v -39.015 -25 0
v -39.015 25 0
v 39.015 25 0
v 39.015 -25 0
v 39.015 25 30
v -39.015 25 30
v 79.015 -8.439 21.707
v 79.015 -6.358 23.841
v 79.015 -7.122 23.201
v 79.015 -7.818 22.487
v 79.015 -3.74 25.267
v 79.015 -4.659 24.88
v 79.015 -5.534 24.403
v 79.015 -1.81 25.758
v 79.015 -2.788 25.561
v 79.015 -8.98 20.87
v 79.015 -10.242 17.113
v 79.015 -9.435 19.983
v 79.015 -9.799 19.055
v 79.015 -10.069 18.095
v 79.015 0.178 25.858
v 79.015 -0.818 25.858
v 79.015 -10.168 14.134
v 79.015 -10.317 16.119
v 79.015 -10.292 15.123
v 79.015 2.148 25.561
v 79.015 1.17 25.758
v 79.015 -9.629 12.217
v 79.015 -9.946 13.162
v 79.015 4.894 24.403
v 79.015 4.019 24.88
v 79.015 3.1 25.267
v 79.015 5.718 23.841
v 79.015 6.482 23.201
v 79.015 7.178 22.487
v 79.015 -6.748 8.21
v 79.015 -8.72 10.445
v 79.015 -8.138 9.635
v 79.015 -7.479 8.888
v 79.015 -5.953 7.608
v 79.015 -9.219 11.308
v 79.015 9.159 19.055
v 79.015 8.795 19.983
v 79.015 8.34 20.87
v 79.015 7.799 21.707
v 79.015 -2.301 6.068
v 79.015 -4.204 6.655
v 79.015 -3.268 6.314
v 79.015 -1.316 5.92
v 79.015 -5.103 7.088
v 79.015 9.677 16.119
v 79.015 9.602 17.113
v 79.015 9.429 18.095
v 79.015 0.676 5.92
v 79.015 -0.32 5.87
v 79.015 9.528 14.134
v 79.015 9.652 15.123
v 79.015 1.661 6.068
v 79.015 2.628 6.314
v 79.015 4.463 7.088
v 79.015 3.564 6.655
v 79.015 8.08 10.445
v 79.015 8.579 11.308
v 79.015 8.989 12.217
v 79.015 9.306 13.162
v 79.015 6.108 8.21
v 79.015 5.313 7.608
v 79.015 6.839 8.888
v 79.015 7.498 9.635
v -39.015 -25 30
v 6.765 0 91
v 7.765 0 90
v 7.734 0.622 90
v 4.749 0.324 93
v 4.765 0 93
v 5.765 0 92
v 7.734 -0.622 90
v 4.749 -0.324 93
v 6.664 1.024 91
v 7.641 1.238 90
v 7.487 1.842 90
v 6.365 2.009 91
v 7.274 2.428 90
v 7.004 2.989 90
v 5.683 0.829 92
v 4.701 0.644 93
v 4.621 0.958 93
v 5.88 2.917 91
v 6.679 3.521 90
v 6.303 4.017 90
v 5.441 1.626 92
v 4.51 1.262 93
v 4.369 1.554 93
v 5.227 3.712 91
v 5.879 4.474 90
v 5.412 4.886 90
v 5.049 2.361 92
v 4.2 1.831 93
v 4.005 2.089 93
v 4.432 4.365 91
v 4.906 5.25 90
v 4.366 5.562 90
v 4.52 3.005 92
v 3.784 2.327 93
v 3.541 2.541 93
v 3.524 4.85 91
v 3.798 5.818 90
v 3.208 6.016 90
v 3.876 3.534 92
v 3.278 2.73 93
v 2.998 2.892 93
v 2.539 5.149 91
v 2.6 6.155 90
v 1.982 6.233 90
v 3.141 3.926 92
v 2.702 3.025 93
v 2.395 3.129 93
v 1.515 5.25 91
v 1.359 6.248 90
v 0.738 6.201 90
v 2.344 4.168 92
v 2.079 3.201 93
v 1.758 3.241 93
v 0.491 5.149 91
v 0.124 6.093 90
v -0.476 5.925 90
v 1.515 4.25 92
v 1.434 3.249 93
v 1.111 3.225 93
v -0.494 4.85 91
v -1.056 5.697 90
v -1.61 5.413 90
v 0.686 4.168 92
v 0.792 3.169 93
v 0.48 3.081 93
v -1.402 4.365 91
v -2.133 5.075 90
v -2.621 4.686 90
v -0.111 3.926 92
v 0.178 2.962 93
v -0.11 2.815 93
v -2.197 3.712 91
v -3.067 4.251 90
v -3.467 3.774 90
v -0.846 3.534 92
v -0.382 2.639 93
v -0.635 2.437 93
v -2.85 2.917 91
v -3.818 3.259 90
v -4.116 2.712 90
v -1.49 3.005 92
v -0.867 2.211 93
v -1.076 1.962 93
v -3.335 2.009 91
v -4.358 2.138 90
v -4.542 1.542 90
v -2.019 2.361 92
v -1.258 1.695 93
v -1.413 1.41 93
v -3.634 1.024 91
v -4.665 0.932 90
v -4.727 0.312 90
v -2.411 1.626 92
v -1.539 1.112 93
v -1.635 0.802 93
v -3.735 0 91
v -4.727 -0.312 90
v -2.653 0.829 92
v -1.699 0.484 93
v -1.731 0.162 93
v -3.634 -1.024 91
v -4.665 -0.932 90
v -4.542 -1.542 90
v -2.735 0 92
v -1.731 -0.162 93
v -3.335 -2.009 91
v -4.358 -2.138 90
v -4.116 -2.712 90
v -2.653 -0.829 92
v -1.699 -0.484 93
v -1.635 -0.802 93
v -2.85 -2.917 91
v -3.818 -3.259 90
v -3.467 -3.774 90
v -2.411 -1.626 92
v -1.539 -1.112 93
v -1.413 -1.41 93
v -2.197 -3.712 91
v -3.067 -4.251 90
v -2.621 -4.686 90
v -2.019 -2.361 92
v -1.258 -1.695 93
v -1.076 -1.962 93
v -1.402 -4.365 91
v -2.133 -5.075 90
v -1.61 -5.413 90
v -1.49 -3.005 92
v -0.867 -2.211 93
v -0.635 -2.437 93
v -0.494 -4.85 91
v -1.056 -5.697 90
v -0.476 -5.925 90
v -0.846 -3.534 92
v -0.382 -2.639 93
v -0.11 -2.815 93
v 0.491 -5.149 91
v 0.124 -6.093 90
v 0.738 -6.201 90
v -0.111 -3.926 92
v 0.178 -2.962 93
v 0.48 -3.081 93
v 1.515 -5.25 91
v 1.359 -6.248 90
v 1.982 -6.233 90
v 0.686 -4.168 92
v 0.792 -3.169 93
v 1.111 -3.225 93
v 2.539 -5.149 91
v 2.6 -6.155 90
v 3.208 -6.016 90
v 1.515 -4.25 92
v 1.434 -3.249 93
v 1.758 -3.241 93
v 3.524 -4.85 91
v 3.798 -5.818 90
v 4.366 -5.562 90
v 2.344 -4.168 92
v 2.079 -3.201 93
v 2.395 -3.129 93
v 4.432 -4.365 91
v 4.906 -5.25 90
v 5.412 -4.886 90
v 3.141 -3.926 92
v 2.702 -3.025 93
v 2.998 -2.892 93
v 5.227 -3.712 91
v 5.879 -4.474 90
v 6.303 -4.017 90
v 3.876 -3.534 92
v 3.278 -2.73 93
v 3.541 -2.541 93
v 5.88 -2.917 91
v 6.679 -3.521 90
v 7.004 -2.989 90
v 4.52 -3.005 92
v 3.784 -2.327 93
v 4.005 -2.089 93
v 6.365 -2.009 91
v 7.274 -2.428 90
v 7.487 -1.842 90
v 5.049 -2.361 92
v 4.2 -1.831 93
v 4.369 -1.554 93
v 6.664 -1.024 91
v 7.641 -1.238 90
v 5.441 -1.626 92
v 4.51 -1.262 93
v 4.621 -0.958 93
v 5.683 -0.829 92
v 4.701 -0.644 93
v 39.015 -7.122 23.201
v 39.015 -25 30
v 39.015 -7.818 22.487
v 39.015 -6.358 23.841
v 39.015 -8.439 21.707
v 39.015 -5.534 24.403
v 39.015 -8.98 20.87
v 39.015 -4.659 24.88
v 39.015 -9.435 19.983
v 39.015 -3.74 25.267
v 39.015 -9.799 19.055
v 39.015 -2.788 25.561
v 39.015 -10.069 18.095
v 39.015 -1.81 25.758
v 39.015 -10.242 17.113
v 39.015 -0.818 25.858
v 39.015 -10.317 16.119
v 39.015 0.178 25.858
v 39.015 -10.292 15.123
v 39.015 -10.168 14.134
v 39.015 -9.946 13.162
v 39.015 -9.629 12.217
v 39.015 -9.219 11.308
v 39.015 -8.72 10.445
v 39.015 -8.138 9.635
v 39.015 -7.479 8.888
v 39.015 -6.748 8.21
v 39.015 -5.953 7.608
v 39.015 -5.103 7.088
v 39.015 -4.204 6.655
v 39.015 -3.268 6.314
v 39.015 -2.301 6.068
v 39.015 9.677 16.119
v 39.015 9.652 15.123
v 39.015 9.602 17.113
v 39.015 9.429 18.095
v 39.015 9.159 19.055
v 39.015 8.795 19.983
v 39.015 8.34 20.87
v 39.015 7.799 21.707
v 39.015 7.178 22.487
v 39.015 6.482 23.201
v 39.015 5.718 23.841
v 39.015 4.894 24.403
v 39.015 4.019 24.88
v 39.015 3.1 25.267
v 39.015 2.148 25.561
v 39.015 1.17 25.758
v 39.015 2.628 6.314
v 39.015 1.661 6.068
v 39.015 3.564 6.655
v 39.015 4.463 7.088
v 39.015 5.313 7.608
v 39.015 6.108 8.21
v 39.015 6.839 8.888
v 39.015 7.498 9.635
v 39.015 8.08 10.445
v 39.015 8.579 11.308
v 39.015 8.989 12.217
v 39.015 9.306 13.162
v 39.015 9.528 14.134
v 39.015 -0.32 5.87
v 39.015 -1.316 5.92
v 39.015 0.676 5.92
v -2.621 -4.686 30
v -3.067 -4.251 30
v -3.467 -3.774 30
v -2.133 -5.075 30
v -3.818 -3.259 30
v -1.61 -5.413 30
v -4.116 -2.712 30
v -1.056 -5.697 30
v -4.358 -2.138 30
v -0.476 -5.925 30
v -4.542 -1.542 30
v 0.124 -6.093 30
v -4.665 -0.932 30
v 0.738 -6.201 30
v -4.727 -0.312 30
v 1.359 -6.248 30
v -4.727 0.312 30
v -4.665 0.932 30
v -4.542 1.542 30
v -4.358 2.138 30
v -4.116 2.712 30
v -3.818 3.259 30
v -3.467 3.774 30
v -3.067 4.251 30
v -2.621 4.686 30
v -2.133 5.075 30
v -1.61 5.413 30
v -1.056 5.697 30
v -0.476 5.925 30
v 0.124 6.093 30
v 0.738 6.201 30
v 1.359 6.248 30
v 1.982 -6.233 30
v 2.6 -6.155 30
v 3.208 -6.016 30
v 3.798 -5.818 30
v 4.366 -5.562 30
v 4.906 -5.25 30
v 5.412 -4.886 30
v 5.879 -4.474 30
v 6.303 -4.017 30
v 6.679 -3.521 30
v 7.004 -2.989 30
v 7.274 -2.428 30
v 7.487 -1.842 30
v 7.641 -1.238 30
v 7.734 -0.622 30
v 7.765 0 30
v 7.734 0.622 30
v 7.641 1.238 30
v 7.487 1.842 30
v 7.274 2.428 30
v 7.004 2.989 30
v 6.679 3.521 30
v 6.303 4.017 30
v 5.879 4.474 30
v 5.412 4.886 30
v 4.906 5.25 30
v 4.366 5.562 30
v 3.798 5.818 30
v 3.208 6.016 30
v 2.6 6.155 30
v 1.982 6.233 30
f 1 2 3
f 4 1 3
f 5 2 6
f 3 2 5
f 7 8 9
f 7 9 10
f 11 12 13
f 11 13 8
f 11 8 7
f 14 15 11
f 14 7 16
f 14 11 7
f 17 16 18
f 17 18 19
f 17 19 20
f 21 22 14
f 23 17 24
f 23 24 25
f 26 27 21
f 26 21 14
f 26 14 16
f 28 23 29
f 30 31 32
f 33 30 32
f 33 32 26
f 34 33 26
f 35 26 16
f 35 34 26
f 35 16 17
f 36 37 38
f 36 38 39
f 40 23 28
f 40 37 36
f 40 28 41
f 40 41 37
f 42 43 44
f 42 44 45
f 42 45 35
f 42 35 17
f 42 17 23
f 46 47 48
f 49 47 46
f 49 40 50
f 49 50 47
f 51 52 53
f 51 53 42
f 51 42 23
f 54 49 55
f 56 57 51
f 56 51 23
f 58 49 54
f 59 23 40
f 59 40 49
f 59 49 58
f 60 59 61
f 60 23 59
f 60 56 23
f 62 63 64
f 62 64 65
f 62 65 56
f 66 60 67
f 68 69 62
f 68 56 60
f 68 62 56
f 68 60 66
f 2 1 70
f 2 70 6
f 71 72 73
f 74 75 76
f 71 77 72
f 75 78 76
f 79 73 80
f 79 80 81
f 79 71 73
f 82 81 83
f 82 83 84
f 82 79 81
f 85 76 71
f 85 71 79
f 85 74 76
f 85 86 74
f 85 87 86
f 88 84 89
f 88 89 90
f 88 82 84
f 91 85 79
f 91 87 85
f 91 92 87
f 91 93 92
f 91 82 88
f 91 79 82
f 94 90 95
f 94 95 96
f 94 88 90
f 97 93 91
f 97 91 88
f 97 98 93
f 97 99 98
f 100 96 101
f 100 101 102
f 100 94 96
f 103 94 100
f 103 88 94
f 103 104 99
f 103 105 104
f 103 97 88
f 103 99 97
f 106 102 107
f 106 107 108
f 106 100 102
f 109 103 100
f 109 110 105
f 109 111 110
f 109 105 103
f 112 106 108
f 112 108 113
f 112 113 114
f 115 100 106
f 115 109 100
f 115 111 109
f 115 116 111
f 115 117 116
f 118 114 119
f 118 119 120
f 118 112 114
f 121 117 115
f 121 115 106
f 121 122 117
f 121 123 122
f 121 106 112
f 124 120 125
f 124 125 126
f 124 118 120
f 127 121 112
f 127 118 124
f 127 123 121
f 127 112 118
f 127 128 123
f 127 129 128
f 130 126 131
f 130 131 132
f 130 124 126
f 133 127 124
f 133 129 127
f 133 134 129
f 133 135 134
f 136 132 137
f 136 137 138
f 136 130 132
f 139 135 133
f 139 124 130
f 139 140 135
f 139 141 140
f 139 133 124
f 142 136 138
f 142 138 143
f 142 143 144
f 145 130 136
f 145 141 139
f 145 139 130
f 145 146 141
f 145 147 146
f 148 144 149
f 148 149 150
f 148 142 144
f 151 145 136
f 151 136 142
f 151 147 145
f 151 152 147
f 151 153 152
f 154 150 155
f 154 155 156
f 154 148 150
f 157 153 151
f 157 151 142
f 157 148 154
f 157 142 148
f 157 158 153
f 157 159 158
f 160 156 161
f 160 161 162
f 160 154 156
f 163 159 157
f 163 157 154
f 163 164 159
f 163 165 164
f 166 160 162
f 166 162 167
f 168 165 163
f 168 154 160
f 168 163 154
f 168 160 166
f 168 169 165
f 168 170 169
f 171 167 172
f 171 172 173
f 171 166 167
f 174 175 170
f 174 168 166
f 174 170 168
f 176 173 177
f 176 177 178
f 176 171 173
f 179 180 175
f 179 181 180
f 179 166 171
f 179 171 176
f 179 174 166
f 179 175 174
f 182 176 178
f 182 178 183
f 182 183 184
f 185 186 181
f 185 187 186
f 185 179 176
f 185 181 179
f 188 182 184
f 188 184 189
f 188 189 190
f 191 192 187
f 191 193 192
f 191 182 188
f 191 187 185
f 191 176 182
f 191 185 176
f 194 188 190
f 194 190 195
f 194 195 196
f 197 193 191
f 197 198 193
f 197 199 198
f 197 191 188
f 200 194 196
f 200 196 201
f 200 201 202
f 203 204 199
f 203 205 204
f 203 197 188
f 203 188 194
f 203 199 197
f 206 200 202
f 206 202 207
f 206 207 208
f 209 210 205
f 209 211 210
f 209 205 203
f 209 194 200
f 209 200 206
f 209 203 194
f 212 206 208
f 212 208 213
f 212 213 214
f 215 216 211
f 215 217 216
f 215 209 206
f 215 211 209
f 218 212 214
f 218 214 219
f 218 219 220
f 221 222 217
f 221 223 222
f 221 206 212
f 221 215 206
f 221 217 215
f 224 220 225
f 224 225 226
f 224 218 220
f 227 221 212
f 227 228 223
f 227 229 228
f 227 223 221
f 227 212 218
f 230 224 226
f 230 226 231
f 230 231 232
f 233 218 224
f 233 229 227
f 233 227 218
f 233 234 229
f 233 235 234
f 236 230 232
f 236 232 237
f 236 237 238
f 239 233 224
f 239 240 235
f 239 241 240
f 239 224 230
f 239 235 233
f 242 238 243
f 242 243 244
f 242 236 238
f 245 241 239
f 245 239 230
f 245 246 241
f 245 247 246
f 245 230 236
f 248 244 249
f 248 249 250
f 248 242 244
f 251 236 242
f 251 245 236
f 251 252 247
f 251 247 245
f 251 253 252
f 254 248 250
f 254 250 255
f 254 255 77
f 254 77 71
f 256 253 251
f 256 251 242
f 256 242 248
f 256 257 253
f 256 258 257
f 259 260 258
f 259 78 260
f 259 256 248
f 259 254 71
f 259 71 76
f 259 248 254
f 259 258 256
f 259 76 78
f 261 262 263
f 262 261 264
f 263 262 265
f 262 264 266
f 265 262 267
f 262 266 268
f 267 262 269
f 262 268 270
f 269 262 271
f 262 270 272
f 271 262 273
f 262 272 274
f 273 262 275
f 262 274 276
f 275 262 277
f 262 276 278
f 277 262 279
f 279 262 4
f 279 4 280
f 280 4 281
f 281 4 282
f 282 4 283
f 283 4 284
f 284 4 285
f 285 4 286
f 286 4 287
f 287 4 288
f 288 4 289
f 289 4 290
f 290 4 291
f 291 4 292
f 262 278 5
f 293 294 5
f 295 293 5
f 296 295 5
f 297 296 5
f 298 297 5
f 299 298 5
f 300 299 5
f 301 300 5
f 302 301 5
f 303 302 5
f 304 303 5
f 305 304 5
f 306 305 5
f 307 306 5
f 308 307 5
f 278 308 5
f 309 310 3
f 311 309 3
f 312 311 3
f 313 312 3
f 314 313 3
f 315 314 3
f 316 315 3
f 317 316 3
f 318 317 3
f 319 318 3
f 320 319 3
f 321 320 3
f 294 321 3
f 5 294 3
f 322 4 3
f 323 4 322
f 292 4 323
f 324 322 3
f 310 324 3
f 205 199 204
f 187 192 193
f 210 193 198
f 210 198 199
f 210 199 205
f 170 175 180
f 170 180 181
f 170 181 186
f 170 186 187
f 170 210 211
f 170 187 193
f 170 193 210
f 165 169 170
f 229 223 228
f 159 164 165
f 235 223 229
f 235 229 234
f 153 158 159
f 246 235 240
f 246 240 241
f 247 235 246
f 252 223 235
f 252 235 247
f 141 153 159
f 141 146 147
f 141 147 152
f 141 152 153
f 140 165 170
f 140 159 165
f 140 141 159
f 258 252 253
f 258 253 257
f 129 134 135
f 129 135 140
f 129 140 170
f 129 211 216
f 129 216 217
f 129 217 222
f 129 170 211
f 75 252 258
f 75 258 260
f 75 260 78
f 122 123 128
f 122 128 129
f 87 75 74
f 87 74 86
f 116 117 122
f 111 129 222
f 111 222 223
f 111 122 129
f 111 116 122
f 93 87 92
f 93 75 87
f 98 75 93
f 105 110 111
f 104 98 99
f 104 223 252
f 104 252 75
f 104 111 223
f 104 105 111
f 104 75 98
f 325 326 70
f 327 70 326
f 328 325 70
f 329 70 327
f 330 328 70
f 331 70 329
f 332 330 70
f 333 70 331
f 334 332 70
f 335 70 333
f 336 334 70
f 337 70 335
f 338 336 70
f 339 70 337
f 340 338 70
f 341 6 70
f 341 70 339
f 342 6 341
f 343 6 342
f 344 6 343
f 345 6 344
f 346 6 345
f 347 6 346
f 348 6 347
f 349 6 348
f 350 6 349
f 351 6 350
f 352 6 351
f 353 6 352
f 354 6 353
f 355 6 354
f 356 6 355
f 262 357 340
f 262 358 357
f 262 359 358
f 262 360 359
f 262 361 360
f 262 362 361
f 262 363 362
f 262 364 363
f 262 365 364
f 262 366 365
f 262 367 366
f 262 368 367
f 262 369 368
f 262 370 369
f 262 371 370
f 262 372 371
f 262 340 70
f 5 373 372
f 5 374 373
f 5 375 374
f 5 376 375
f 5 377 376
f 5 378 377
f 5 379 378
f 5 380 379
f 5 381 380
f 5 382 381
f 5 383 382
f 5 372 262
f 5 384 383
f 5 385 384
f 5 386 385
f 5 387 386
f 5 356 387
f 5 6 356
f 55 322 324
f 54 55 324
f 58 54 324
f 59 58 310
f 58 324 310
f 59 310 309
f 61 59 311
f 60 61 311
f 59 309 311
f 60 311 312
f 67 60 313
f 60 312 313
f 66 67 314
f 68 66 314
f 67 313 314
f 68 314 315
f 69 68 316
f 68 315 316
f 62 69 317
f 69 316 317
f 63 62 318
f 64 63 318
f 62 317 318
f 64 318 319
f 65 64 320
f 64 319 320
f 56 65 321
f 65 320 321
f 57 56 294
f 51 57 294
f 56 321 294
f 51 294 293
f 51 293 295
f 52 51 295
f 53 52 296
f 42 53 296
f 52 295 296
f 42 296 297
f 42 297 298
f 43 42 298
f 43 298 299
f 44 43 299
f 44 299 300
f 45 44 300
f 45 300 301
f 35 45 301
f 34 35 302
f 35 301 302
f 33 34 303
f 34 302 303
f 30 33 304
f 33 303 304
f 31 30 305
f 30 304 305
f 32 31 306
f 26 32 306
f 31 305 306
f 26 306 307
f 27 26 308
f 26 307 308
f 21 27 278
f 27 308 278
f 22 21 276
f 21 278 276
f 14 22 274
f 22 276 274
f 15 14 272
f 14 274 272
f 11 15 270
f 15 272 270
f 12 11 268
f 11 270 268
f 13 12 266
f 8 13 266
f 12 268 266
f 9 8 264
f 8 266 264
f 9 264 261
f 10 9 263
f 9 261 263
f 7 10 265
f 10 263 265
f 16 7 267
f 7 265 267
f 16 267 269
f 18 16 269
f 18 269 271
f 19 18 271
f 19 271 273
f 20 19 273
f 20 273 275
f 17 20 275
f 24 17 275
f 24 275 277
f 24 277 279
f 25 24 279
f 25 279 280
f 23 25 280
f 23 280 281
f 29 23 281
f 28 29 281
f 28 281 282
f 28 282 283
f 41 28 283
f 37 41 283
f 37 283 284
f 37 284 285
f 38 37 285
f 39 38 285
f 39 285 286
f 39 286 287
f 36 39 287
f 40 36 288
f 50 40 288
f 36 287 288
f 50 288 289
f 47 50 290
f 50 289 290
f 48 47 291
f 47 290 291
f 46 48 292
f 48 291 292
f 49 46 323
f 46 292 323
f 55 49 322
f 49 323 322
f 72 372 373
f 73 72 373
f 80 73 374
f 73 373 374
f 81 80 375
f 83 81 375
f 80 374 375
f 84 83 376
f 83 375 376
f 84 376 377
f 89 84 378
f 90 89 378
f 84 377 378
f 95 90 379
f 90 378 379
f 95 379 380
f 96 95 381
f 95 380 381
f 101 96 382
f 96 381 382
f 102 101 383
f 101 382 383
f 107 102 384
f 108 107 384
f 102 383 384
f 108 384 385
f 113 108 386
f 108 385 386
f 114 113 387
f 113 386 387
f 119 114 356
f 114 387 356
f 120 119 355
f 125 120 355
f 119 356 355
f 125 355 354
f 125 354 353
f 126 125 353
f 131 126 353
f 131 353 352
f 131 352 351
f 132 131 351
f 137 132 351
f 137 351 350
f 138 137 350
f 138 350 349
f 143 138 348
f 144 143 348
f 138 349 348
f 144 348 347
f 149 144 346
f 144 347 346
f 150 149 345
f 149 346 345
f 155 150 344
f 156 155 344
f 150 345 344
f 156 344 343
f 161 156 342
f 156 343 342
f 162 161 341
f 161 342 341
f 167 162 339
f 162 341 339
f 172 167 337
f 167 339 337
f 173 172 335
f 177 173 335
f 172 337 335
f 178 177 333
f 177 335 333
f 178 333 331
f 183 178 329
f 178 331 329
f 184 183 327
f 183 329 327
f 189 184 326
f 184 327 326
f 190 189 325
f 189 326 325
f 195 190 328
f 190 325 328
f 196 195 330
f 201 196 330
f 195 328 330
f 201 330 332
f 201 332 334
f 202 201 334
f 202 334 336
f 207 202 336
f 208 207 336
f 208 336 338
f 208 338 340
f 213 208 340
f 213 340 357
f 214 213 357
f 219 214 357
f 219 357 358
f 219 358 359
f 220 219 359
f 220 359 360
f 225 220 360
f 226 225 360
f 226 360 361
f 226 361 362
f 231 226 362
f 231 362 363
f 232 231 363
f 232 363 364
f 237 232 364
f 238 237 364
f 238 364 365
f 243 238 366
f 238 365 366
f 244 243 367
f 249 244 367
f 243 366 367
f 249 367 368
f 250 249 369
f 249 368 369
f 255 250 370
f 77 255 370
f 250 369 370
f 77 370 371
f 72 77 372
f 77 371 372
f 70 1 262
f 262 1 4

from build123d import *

# Parameters (mm, degrees)
SKETCH1_W           = 78.03
SKETCH1_H           = 50
BOSS_EXTRUDE2_DEPTH = 30
SKETCH2_R           = 10
BOSS_EXTRUDE3_DEPTH = 40
SKETCH3_R           = 6.25
BOSS_EXTRUDE8_DEPTH = 63
CHAMFER6_SIZE       = 3


with BuildPart() as part:
    # Sketch1 → Boss-Extrude2 (new body)
    with BuildSketch(Plane.XY):
        Rectangle(SKETCH1_W, SKETCH1_H)
    extrude(amount=BOSS_EXTRUDE2_DEPTH)

    # Sketch2 → Boss-Extrude3 (add)
    with BuildSketch(Plane(origin=(39.015, 0, 0), x_dir=(0, 0, -1), z_dir=(1, 0, 0))):
        with Locations((-15.87, -0.32)):
            Circle(SKETCH2_R)
    extrude(amount=BOSS_EXTRUDE3_DEPTH)

    # Sketch3 → Boss-Extrude8 (add)
    with BuildSketch(Plane.XY.offset(30)):
        with Locations((1.515, 0)):
            Circle(SKETCH3_R)
    extrude(amount=BOSS_EXTRUDE8_DEPTH)

    # Chamfer6
    chamfer6_edges = [part.edges().sort_by_distance(p)[0] for p in [
        (-4.735, 0, 93),
    ]]
    chamfer(chamfer6_edges, length=CHAMFER6_SIZE)


solid = part.part
